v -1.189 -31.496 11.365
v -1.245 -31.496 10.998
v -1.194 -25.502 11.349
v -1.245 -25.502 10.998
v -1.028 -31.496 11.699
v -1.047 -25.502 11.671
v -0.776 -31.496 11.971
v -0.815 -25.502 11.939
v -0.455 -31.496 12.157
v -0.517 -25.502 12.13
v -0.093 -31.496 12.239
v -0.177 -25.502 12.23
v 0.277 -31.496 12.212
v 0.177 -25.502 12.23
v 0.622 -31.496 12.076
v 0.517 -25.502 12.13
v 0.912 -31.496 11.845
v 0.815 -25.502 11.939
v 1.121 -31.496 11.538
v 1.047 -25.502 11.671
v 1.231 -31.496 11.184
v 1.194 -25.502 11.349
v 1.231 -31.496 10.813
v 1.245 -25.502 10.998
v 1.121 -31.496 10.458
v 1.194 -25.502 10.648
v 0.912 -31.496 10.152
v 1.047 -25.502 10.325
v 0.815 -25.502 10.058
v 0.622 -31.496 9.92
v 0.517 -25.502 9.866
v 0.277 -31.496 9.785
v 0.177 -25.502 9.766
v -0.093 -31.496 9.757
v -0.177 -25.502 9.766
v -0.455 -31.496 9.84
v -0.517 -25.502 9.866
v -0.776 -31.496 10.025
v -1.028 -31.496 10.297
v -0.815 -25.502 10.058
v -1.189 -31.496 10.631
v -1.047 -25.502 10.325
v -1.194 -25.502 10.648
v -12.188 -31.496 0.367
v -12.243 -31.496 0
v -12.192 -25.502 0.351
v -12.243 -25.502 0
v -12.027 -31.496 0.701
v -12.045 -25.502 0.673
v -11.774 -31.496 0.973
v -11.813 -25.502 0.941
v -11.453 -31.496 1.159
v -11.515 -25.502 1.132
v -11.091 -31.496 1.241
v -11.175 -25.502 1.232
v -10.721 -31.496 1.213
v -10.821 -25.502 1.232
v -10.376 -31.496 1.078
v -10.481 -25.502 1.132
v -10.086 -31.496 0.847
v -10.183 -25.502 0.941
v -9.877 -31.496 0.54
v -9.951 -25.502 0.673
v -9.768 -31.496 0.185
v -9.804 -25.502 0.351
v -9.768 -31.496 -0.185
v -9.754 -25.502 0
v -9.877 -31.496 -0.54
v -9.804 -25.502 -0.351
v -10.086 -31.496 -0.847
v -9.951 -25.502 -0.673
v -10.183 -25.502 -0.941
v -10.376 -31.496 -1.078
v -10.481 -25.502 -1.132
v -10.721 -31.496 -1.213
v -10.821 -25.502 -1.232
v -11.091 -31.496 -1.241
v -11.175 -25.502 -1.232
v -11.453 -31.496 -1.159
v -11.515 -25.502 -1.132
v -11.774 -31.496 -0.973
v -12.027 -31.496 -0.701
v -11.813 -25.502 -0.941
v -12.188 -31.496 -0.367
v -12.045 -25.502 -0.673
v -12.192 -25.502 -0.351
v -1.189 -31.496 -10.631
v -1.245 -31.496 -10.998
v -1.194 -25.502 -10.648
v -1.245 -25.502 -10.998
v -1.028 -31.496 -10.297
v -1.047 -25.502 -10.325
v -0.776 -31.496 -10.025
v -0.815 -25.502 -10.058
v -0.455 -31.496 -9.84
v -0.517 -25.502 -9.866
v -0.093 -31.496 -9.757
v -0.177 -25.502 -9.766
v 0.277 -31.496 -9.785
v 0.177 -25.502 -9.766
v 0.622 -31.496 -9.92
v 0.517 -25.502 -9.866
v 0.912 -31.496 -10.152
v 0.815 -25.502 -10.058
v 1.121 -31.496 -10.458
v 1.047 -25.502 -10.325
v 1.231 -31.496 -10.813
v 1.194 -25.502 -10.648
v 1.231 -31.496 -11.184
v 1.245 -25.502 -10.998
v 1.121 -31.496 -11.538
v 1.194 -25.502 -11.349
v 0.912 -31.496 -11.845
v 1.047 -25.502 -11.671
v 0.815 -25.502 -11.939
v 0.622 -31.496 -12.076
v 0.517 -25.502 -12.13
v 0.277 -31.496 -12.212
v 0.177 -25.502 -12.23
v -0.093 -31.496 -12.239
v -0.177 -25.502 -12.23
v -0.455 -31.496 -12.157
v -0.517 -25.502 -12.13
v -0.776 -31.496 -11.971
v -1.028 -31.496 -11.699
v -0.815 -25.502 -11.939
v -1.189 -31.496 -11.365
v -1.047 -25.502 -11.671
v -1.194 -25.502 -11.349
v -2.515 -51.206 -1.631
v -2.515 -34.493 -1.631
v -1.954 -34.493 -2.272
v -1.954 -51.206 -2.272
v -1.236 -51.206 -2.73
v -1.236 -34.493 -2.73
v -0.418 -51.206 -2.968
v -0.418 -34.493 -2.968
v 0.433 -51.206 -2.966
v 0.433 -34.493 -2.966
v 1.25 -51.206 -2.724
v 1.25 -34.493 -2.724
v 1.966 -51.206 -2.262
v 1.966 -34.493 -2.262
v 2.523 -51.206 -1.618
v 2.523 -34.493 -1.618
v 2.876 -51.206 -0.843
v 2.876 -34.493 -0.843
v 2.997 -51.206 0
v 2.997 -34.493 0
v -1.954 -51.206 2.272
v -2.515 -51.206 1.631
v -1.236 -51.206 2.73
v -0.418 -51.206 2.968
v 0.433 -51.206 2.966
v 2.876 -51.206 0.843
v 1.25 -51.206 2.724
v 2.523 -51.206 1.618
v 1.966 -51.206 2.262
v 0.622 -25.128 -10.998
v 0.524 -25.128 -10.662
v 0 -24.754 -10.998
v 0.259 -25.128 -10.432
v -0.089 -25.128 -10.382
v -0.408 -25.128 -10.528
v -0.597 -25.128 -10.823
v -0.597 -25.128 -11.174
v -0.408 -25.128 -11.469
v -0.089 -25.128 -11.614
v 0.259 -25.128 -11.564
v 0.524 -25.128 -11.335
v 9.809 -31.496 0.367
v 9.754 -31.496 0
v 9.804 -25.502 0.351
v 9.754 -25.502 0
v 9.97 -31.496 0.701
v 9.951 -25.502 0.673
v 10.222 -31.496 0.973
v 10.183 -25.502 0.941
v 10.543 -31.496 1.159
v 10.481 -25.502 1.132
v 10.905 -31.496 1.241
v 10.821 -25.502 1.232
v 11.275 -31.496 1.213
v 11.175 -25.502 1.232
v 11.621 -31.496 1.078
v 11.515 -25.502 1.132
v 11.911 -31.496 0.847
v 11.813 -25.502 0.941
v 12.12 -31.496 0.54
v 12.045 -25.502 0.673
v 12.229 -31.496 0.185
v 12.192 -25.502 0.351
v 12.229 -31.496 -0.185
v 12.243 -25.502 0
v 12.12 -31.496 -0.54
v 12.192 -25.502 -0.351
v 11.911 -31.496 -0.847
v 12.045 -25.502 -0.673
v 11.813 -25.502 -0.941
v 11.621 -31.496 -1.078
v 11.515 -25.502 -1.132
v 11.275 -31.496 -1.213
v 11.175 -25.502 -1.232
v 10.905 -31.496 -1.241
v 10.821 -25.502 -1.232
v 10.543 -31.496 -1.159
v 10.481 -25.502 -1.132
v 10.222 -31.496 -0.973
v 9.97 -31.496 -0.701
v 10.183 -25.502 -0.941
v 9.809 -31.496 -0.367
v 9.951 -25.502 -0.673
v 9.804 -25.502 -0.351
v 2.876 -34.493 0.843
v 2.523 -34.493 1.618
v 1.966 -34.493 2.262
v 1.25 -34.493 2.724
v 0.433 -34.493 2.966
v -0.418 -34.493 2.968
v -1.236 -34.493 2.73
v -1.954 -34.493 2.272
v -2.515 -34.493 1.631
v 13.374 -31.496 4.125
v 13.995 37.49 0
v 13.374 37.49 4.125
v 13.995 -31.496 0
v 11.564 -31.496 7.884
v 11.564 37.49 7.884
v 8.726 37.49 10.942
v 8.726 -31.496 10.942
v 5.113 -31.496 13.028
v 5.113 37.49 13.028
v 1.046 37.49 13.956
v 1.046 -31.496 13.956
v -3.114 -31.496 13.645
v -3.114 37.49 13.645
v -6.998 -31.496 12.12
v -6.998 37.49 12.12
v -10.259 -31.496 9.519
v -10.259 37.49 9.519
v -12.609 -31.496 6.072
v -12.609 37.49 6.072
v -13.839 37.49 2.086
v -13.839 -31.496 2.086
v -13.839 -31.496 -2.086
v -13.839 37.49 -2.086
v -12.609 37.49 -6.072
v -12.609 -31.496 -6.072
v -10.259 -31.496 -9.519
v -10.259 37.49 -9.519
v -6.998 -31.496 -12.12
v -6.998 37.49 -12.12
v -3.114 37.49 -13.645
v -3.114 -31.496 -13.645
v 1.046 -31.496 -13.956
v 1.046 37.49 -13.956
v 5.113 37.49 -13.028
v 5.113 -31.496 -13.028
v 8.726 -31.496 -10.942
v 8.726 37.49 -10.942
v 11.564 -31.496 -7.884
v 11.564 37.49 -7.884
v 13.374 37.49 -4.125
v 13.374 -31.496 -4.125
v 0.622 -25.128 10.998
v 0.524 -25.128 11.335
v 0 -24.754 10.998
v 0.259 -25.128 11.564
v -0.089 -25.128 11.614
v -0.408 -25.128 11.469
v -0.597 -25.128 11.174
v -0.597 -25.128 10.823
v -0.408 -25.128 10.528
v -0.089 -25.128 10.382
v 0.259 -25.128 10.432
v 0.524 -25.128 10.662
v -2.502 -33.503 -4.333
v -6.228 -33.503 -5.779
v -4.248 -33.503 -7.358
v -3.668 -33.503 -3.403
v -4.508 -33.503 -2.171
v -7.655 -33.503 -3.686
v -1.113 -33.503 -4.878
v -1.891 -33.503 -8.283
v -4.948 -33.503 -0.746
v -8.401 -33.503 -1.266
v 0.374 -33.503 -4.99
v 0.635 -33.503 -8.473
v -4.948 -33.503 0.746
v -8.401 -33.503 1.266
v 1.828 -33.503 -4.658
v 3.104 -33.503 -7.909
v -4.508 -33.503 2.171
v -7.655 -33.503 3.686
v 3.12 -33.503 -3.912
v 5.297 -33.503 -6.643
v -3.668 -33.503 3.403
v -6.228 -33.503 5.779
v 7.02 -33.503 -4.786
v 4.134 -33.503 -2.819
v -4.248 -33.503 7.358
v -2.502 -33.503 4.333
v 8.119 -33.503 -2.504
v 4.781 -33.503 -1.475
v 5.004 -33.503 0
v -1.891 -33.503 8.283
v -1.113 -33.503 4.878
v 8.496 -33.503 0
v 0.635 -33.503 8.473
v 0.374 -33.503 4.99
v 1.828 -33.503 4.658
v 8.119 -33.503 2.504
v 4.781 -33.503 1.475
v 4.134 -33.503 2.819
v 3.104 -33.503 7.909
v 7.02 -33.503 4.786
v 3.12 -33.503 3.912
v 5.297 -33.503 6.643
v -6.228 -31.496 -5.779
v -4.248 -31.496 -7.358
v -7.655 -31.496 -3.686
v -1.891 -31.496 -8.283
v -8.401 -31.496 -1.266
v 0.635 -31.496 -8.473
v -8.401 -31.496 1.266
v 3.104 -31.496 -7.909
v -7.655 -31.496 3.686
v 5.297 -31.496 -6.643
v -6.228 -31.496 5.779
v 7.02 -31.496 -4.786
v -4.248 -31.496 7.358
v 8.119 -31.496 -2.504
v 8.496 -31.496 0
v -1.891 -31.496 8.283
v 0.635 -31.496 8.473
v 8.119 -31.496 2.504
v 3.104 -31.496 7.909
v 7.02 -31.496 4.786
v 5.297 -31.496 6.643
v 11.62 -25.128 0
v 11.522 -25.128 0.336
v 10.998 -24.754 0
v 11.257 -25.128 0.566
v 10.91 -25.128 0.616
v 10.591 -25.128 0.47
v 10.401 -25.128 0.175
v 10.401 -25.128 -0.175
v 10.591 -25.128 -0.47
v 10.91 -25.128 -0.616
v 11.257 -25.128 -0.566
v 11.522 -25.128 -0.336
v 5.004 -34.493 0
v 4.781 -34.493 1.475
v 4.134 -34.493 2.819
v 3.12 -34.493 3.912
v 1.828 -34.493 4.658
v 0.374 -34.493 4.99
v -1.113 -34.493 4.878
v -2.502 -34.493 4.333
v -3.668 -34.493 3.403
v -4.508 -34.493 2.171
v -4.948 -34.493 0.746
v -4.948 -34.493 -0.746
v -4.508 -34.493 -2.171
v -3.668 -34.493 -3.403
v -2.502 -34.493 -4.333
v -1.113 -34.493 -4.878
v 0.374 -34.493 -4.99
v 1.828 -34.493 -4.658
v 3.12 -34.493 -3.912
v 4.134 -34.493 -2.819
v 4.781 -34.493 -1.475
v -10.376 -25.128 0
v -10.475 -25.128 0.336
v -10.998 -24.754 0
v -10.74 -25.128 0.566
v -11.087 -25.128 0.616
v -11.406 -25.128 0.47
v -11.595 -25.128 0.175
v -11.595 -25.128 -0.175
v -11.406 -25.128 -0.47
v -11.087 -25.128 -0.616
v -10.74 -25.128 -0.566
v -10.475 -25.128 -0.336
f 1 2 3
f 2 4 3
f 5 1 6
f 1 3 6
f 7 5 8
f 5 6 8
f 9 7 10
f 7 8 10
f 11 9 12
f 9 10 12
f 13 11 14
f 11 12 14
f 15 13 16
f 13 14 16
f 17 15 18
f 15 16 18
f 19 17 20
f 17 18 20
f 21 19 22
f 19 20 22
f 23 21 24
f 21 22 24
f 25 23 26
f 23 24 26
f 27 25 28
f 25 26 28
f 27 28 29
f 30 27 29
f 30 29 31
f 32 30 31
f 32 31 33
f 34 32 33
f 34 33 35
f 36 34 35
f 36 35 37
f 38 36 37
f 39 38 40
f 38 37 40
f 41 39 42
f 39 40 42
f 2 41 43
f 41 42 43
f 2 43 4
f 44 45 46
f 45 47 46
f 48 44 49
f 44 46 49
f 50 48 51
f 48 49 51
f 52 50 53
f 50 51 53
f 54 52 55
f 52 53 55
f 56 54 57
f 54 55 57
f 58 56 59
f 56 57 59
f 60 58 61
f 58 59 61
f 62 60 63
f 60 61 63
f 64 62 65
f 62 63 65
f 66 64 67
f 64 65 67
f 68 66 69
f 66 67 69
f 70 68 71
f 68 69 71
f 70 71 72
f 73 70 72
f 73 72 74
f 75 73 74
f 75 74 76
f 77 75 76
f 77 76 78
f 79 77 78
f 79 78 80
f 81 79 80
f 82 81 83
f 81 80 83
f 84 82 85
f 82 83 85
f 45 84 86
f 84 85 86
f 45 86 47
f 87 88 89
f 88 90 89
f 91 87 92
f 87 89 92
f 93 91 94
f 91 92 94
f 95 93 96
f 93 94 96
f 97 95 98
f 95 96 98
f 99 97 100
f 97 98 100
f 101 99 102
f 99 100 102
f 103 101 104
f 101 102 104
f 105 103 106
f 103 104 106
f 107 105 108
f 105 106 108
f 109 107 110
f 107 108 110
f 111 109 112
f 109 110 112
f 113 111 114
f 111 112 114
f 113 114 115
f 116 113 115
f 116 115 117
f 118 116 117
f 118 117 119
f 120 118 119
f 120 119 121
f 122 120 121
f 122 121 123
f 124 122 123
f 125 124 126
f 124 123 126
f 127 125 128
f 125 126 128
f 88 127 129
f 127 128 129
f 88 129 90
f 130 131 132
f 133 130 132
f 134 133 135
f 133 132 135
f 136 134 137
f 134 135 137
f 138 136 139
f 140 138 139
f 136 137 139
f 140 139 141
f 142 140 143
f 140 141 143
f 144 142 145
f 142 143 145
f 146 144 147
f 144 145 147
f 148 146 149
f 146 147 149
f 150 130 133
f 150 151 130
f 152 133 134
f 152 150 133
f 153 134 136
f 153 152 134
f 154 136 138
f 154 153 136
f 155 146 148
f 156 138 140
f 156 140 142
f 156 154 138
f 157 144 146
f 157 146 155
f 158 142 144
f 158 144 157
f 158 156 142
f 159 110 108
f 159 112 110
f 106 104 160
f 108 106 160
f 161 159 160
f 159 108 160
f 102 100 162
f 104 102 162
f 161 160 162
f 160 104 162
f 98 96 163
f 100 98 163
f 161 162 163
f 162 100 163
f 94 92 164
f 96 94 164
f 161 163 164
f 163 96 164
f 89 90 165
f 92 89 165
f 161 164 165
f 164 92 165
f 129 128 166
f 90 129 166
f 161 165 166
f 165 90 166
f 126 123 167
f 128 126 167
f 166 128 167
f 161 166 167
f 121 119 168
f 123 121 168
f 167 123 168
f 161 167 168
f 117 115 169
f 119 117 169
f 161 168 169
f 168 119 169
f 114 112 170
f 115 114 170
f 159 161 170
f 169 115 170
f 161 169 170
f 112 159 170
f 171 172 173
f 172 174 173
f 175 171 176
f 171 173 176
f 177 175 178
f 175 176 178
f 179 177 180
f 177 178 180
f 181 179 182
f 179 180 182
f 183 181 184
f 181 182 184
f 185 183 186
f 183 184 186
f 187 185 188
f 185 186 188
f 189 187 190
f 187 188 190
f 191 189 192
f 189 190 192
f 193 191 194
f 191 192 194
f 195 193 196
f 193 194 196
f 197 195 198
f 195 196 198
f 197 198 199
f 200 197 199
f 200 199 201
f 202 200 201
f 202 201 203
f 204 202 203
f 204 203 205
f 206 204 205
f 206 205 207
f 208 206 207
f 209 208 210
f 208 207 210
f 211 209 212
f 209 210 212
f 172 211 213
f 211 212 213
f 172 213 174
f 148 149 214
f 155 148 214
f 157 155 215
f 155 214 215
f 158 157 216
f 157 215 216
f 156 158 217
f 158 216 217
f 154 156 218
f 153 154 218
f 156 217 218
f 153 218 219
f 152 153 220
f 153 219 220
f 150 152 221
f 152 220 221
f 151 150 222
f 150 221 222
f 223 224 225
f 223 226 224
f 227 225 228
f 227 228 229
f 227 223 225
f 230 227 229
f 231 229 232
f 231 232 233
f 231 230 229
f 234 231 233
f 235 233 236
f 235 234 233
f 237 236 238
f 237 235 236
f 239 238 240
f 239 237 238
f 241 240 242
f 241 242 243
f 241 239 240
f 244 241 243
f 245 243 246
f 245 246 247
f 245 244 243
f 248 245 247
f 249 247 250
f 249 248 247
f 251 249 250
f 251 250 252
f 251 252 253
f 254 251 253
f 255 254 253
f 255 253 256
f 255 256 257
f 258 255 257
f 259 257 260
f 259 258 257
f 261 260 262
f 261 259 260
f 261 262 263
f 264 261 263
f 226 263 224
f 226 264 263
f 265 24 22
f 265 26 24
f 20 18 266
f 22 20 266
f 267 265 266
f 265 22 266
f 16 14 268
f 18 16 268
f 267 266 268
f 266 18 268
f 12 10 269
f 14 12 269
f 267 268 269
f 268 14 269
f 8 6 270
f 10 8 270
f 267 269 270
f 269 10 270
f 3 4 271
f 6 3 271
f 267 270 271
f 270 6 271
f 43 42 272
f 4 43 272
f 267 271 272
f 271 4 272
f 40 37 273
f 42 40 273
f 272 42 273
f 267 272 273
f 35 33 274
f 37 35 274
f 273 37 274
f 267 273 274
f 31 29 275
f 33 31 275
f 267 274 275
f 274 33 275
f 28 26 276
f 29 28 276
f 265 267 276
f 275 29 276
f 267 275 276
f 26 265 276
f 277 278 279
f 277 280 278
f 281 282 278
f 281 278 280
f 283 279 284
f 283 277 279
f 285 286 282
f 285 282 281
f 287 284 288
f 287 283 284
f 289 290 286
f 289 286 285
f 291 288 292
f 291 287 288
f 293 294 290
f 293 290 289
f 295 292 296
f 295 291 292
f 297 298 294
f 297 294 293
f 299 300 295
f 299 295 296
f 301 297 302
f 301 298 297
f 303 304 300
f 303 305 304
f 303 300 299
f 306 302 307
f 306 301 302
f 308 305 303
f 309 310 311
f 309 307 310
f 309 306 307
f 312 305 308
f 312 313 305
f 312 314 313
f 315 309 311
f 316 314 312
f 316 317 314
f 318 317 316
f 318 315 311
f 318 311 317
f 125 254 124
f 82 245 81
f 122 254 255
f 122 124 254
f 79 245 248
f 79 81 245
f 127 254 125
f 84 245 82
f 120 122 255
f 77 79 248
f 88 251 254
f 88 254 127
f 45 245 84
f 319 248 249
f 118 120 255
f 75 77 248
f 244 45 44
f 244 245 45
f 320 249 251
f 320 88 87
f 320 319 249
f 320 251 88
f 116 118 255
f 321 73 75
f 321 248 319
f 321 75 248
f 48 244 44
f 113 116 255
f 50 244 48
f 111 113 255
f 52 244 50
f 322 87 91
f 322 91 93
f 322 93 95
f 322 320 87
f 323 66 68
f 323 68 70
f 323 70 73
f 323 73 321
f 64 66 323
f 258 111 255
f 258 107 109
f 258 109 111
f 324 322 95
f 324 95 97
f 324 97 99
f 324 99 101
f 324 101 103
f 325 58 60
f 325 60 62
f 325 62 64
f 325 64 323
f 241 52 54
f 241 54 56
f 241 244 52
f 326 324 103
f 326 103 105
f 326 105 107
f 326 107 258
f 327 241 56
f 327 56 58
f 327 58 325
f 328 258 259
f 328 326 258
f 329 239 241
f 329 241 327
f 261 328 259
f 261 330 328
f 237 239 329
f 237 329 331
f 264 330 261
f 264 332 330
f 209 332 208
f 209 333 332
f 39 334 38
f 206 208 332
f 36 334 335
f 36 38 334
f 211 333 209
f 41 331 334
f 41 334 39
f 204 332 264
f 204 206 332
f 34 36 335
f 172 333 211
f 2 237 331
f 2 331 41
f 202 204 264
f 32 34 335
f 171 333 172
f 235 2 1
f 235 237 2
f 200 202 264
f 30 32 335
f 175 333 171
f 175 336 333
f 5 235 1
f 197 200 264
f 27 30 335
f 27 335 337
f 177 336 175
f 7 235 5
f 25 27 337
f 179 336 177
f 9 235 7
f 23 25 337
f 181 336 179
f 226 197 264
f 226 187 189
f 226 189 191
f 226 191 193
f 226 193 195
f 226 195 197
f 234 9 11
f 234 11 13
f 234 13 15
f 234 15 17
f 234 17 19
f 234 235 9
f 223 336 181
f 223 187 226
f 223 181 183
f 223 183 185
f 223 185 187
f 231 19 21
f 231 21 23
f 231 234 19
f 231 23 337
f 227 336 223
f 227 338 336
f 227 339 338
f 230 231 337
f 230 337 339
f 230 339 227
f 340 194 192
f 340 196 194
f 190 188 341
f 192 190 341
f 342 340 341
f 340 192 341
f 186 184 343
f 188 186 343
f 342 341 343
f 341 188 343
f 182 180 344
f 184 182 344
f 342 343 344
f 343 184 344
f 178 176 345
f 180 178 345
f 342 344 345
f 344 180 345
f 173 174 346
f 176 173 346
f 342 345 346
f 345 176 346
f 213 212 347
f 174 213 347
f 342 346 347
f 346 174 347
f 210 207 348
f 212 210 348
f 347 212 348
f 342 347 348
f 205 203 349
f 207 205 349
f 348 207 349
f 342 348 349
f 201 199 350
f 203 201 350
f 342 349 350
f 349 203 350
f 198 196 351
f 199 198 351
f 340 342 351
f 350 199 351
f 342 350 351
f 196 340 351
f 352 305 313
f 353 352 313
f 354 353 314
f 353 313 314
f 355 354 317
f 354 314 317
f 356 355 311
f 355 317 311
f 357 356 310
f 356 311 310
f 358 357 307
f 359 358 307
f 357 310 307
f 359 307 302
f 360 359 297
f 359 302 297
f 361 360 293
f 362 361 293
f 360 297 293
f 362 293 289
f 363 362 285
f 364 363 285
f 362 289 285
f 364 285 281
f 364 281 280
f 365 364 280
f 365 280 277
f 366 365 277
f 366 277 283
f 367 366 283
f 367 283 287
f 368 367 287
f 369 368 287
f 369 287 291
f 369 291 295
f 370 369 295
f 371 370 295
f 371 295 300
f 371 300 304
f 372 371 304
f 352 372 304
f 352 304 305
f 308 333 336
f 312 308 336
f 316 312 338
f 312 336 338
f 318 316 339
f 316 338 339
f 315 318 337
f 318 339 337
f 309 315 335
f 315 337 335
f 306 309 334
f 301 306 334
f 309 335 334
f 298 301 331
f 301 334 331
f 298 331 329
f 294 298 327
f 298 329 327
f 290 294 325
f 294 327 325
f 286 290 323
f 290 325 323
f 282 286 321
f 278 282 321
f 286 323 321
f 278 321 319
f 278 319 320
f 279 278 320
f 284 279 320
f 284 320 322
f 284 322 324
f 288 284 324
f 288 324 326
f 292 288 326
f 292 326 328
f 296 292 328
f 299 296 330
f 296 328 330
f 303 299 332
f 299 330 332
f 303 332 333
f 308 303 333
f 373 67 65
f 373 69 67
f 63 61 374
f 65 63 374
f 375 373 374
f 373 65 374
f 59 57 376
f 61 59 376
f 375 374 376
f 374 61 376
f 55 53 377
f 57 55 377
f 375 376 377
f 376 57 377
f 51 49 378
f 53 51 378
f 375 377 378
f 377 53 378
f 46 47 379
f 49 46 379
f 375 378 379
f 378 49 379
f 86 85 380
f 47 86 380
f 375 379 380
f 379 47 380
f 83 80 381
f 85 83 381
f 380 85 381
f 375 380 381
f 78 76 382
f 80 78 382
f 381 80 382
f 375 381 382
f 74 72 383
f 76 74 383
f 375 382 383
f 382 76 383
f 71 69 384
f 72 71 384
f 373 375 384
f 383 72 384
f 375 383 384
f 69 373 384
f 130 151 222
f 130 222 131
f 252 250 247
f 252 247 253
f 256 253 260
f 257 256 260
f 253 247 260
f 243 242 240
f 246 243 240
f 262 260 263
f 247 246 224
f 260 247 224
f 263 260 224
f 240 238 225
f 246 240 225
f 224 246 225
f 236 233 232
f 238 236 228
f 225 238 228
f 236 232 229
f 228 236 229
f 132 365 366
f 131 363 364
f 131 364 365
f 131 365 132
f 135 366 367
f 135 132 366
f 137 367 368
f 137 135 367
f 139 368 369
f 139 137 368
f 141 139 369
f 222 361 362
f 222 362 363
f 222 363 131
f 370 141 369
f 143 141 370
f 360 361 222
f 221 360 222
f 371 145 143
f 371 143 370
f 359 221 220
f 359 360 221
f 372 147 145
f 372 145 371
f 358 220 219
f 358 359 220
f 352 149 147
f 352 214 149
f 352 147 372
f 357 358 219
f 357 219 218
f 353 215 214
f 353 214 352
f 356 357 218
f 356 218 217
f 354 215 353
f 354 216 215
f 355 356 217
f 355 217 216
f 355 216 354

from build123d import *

# Parameters (mm, degrees)
F0_R     = 13.9954
F1_DEPTH = 31.496
F2_DEPTH = 37.4904
F4_DEPTH = 19.7104
F3_R     = 5.0038
F5_DEPTH = 2.9972
F3_R_2   = 8.4963
F6_DEPTH = 2.0066
F7_D     = 2.4892
F7_DEPTH = 5.9944
F7_TIP   = 0.7478311264


with BuildPart() as f1:
    # F0 (on Front) → F1 (new body)
    with BuildSketch(Plane.XZ):
        Circle(F0_R)
    extrude(amount=F1_DEPTH)

    # F2 (add): a face of the model
    f2_faces = [f1.faces().sort_by_distance(p)[0] for p in [
        (0, 0, 0),
    ]]
    extrude(f2_faces, amount=F2_DEPTH)

    # F3 (on face) → F4 (join)
    with BuildSketch(Plane.XZ.offset(31.496)):
        with BuildLine():
            ThreePointArc((-2.5146, -1.6309490121), (0.8504259874, -2.8740186986), (2.9972, 0))
            ThreePointArc((2.9972, 0), (0.8504259874, 2.8740186986), (-2.5146, 1.6309490121))
            Line((-2.5146, 1.6309490121), (-2.5146, -1.6309490121))
        make_face()
    extrude(amount=F4_DEPTH)

    # F3 (on face) → F5 (join)
    with BuildSketch(Plane.XZ.offset(31.496)):
        Circle(F3_R)
        with BuildLine():
            ThreePointArc((-2.5146, 1.6309490121), (0.8504259874, 2.8740186986), (2.9972, 0))
            ThreePointArc((2.9972, 0), (0.8504259874, -2.8740186986), (-2.5146, -1.6309490121))
            ThreePointArc((-2.5146, -1.6309490121), (-2.9972, 0), (-2.5146, 1.6309490121))
        make_face(mode=Mode.SUBTRACT)
        with BuildLine():
            Line((-2.5146, -1.6309490121), (-2.5146, 1.6309490121))
            ThreePointArc((-2.5146, 1.6309490121), (-2.9972, 0), (-2.5146, -1.6309490121))
        make_face()
    extrude(amount=F5_DEPTH)

    # F3 (on face) → F6 (join)
    with BuildSketch(Plane.XZ.offset(31.496)):
        Circle(F3_R_2)
        Circle(F3_R, mode=Mode.SUBTRACT)
    extrude(amount=F6_DEPTH)

    # F7
    with Locations(Plane.XZ.offset(31.496)):
        with Locations((10.9982, 0), (0, -10.9982), (0, 10.9982), (-10.9982, 0)):
            Hole(F7_D / 2, depth=F7_DEPTH)
            with Locations((0, 0, -(F7_DEPTH + F7_TIP / 2))):  # 118° drill point
                Cone(0, F7_D / 2, F7_TIP, mode=Mode.SUBTRACT)


solid = f1.part
